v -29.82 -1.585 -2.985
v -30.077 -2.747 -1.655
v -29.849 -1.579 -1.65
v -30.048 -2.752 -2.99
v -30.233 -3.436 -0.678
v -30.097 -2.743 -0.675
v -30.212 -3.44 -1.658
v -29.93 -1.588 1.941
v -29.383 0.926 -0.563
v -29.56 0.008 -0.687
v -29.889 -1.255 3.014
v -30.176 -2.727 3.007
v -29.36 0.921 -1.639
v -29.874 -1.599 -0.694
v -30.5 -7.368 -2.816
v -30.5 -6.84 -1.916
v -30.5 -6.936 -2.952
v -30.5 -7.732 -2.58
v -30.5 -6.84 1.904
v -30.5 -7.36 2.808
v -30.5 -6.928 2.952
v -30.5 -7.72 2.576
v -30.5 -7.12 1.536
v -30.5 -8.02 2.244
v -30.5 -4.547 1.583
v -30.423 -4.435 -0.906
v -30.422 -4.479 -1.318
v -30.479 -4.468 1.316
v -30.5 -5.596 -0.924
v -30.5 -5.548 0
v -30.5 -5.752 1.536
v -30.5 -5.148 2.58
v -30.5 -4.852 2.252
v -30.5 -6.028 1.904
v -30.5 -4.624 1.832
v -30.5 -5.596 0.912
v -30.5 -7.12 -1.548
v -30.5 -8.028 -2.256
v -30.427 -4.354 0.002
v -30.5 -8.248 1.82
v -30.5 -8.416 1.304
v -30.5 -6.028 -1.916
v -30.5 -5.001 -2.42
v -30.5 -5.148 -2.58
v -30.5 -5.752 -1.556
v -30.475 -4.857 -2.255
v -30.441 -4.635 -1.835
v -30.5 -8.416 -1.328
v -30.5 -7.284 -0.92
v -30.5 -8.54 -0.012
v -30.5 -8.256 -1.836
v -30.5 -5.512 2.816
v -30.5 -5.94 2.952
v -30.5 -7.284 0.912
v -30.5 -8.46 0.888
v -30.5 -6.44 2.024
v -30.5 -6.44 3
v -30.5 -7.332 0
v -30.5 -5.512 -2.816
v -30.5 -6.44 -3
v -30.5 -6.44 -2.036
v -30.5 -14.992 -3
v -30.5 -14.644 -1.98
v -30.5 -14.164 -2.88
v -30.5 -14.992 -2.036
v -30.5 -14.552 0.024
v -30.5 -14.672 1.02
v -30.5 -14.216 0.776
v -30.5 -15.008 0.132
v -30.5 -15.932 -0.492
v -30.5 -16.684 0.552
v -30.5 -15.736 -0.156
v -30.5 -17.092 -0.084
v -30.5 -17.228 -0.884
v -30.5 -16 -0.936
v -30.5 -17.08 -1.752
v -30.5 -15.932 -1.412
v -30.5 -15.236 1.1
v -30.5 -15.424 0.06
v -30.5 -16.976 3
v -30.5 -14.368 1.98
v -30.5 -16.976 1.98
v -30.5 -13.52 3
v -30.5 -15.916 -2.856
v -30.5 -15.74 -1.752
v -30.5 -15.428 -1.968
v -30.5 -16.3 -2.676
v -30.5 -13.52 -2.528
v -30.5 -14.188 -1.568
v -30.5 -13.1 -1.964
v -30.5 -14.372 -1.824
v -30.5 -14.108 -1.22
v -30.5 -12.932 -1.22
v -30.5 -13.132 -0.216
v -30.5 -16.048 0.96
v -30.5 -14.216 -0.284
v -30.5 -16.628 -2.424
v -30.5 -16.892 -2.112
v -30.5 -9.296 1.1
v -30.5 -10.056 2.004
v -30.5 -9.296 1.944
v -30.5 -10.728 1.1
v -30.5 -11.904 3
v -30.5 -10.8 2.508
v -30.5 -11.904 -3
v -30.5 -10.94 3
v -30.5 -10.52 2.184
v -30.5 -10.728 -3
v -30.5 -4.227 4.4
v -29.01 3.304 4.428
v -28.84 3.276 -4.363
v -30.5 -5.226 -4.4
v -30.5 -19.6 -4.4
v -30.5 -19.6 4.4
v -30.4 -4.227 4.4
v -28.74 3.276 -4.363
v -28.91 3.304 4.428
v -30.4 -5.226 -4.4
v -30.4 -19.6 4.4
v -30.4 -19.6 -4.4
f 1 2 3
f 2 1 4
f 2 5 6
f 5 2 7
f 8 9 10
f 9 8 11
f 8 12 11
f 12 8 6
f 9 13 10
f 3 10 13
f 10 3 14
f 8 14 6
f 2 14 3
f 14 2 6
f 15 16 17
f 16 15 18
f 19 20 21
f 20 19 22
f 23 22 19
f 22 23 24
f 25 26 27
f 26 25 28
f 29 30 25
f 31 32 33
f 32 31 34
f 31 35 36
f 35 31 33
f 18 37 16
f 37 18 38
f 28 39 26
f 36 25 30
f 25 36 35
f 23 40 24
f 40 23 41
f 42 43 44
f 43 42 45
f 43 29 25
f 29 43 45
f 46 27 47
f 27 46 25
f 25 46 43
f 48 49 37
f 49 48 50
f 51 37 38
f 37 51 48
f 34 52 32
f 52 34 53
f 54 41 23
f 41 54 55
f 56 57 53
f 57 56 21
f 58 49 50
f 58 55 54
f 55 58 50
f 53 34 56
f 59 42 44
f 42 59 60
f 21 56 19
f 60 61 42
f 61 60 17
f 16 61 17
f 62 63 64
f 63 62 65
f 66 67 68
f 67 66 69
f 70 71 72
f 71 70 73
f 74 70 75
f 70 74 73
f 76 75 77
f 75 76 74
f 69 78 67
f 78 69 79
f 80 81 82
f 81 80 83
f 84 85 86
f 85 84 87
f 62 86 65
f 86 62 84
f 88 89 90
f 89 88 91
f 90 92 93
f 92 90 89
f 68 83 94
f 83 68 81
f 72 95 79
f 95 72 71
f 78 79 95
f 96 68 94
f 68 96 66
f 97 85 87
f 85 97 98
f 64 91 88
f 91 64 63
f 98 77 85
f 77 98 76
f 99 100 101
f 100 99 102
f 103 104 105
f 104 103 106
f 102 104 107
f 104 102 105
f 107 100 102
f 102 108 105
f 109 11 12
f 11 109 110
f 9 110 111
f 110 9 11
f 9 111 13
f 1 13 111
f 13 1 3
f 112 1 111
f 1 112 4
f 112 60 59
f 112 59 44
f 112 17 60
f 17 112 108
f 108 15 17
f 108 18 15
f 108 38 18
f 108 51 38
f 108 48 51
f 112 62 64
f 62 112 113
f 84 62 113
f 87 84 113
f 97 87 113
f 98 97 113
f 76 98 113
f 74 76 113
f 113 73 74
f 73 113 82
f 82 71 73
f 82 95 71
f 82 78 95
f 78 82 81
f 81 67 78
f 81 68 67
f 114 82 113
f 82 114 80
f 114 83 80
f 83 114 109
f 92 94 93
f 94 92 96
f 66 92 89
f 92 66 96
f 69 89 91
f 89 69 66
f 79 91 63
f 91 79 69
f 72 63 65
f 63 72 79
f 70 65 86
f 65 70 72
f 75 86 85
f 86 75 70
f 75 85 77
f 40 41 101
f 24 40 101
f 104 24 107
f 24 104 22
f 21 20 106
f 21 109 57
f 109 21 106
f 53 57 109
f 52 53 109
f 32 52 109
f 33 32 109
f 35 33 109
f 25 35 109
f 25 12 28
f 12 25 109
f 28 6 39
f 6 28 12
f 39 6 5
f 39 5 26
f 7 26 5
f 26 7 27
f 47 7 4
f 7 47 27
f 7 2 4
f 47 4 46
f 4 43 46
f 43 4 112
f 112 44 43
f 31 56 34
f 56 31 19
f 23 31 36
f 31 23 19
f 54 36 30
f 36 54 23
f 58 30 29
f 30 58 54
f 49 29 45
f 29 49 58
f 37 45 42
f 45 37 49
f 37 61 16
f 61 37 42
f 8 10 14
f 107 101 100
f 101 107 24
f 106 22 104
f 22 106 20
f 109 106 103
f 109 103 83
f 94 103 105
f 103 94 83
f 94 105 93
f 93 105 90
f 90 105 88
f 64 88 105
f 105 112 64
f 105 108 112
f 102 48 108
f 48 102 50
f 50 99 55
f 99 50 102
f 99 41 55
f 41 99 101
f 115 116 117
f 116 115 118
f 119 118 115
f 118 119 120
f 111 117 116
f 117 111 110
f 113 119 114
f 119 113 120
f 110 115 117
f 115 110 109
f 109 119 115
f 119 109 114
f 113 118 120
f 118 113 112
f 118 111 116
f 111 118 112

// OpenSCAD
use <../lib.scad>
function ldraw_lib__194295bc02() = [
// 0 Sticker  1.1 x  2.9 with White "4015" on Transparent Background (Formed for Boat Stern Right Side)
// 0 Name: 194295bc02.dat
// 0 Author: Takeshi Takahashi [RainbowDolphin]
// 0 !LDRAW_ORG Part UPDATE 2024-04
// 0 !LICENSE Licensed under CC BY 4.0 : see CAreadme.txt
// 
// 0 BFC CERTIFY CCW
  [0,"BFC","CERTIFY"],
  [0,"BFC","CCW"],
// 
// 0 !KEYWORDS Bricklink 4015stk01, Brickowl 526213, Freighter, Rebrickable 194295
// 0 !KEYWORDS Set 4015
// 
// 0 !HISTORY 2024-05-28 [OrionP] Official Update 2024-04
// 
// 
// 0 BFC NOCLIP
  [0,"BFC","NOCLIP"],
// 4 15 -74.5501 7.4623 -3.9621 -75.12 7.4749 -6.8807 -75.1913 4.1365 -6.8668 -74.6214 4.1239 -3.9481
  [4,15,-74.5501,7.4623,-3.9621,-75.12,7.4749,-6.8807,-75.1913,4.1365,-6.8668,-74.6214,4.1239,-3.9481],
// 4 15 -75.2436 1.6877 -6.8566 -75.1913 4.1365 -6.8668 -75.5298 4.144 -8.6007 -75.5821 1.6952 -8.5905
  [4,15,-75.2436,1.6877,-6.8566,-75.1913,4.1365,-6.8668,-75.5298,4.144,-8.6007,-75.5821,1.6952,-8.5905],
// 4 15 -73.8995 1.7179 .0208 -74.8247 -4.8516 -3.9694 -74.7218 -7.5339 -3.1385 -73.4583 1.4081 2.3146
  [4,15,-73.8995,1.7179,.0208,-74.8247,-4.8516,-3.9694,-74.7218,-7.5339,-3.1385,-73.4583,1.4081,2.3146],
// 4 15 -75.4403 -7.518 -6.8182 -74.7218 -7.5339 -3.1385 -74.8247 -4.8516 -3.9694 -75.2436 1.6877 -6.8566
  [4,15,-75.4403,-7.518,-6.8182,-74.7218,-7.5339,-3.1385,-74.8247,-4.8516,-3.9694,-75.2436,1.6877,-6.8566],
// 3 15 -73.4583 1.4081 2.3146 -73.4008 4.0968 2.3034 -73.8995 1.7179 .0208
  [3,15,-73.4583,1.4081,2.3146,-73.4008,4.0968,2.3034,-73.8995,1.7179,.0208],
// 4 15 -74.6839 1.7353 -3.9969 -73.8995 1.7179 .0208 -73.4008 4.0968 2.3034 -74.6214 4.1239 -3.9481
  [4,15,-74.6839,1.7353,-3.9969,-73.8995,1.7179,.0208,-73.4008,4.0968,2.3034,-74.6214,4.1239,-3.9481],
// 3 15 -74.8247 -4.8516 -3.9694 -74.6839 1.7353 -3.9969 -75.2436 1.6877 -6.8566
  [3,15,-74.8247,-4.8516,-3.9694,-74.6839,1.7353,-3.9969,-75.2436,1.6877,-6.8566],
// 4 15 -74.6214 4.1239 -3.9481 -75.1913 4.1365 -6.8668 -75.2436 1.6877 -6.8566 -74.6839 1.7353 -3.9969
  [4,15,-74.6214,4.1239,-3.9481,-75.1913,4.1365,-6.8668,-75.2436,1.6877,-6.8566,-74.6839,1.7353,-3.9969],
// 4 15 -76.25 6.45 -19.33 -76.25 4.79 -17.1 -76.25 7.38 -17.34 -76.25 7.04 -18.42
  [4,15,-76.25,6.45,-19.33,-76.25,4.79,-17.1,-76.25,7.38,-17.34,-76.25,7.04,-18.42],
// 4 15 -76.25 -7.38 -17.32 -76.25 -4.76 -17.1 -76.25 -6.44 -19.3 -76.25 -7.02 -18.4
  [4,15,-76.25,-7.38,-17.32,-76.25,-4.76,-17.1,-76.25,-6.44,-19.3,-76.25,-7.02,-18.4],
// 4 15 -76.25 -5.61 -20.05 -76.25 -6.44 -19.3 -76.25 -4.76 -17.1 -76.25 -3.84 -17.8
  [4,15,-76.25,-5.61,-20.05,-76.25,-6.44,-19.3,-76.25,-4.76,-17.1,-76.25,-3.84,-17.8],
// 4 15 -76.1967 -3.2912 -11.1704 -76.0573 2.2657 -11.0876 -76.056 3.2957 -11.1979 -76.25 -3.9585 -11.3673
  [4,15,-76.1967,-3.2912,-11.1704,-76.0573,2.2657,-11.0876,-76.056,3.2957,-11.1979,-76.25,-3.9585,-11.3673],
// 3 15 -76.25 2.31 -13.99 -76.25 0 -13.87 -76.25 -3.9585 -11.3673
  [3,15,-76.25,2.31,-13.99,-76.25,0,-13.87,-76.25,-3.9585,-11.3673],
// 4 15 -76.25 -4.76 -15.07 -76.25 -6.45 -12.87 -76.25 -5.63 -12.13 -76.25 -3.84 -14.38
  [4,15,-76.25,-4.76,-15.07,-76.25,-6.45,-12.87,-76.25,-5.63,-12.13,-76.25,-3.84,-14.38],
// 4 15 -76.25 -3.84 -14.38 -76.25 -5.63 -12.13 -76.25 -4.58 -11.56 -76.25 -2.28 -13.99
  [4,15,-76.25,-3.84,-14.38,-76.25,-5.63,-12.13,-76.25,-4.58,-11.56,-76.25,-2.28,-13.99],
// 4 15 -76.25 4.79 -17.1 -76.25 6.45 -19.33 -76.25 5.64 -20.07 -76.25 3.87 -17.8
  [4,15,-76.25,4.79,-17.1,-76.25,6.45,-19.33,-76.25,5.64,-20.07,-76.25,3.87,-17.8],
// 3 15 -76.1967 -3.2912 -11.1704 -76.0682 -.004 -10.8855 -76.0573 2.2657 -11.0876
  [3,15,-76.1967,-3.2912,-11.1704,-76.0682,-.004,-10.8855,-76.0573,2.2657,-11.0876],
// 4 15 -76.25 0 -13.87 -76.25 -2.28 -13.99 -76.25 -4.58 -11.56 -76.25 -3.9585 -11.3673
  [4,15,-76.25,0,-13.87,-76.25,-2.28,-13.99,-76.25,-4.58,-11.56,-76.25,-3.9585,-11.3673],
// 4 15 -76.25 -3.26 -21.04 -76.25 -4.55 -20.62 -76.25 -5.61 -20.05 -76.25 -3.84 -17.8
  [4,15,-76.25,-3.26,-21.04,-76.25,-4.55,-20.62,-76.25,-5.61,-20.05,-76.25,-3.84,-17.8],
// 4 15 -76.25 3.89 -14.38 -76.25 6.049 -12.5036 -76.25 6.45 -12.87 -76.25 4.79 -15.07
  [4,15,-76.25,3.89,-14.38,-76.25,6.049,-12.5036,-76.25,6.45,-12.87,-76.25,4.79,-15.07],
// 4 15 -76.25 6.049 -12.5036 -76.25 3.89 -14.38 -76.25 2.31 -13.99 -76.25 -3.9585 -11.3673
  [4,15,-76.25,6.049,-12.5036,-76.25,3.89,-14.38,-76.25,2.31,-13.99,-76.25,-3.9585,-11.3673],
// 4 15 -76.056 3.2957 -11.1979 -76.1037 4.5868 -11.5886 -76.1885 5.6386 -12.142 -76.25 -3.9585 -11.3673
  [4,15,-76.056,3.2957,-11.1979,-76.1037,4.5868,-11.5886,-76.1885,5.6386,-12.142,-76.25,-3.9585,-11.3673],
// 3 15 -76.25 -3.9585 -11.3673 -76.1885 5.6386 -12.142 -76.25 6.049 -12.5036
  [3,15,-76.25,-3.9585,-11.3673,-76.1885,5.6386,-12.142,-76.25,6.049,-12.5036],
// 4 15 -76.25 .03 -21.35 -76.25 2.3 -18.21 -76.25 3.87 -17.8 -76.25 3.32 -21.04
  [4,15,-76.25,.03,-21.35,-76.25,2.3,-18.21,-76.25,3.87,-17.8,-76.25,3.32,-21.04],
// 4 15 -76.25 5.64 -20.07 -76.25 4.59 -20.64 -76.25 3.32 -21.04 -76.25 3.87 -17.8
  [4,15,-76.25,5.64,-20.07,-76.25,4.59,-20.64,-76.25,3.32,-21.04,-76.25,3.87,-17.8],
// 4 15 -76.25 -6.45 -12.87 -76.25 -4.76 -15.07 -76.25 -7.38 -14.85 -76.25 -7.04 -13.78
  [4,15,-76.25,-6.45,-12.87,-76.25,-4.76,-15.07,-76.25,-7.38,-14.85,-76.25,-7.04,-13.78],
// 4 15 -76.25 -3.84 -17.8 -76.25 -2.28 -18.21 -76.25 -2.22 -21.15 -76.25 -3.26 -21.04
  [4,15,-76.25,-3.84,-17.8,-76.25,-2.28,-18.21,-76.25,-2.22,-21.15,-76.25,-3.26,-21.04],
// 4 15 -76.25 -7.38 -17.32 -76.25 -7.5 -16.1 -76.25 -7.38 -14.85 -76.25 -5.06 -16.1
  [4,15,-76.25,-7.38,-17.32,-76.25,-7.5,-16.1,-76.25,-7.38,-14.85,-76.25,-5.06,-16.1],
// 3 15 -76.25 0 -18.33 -76.25 2.3 -18.21 -76.25 .03 -21.35
  [3,15,-76.25,0,-18.33,-76.25,2.3,-18.21,-76.25,.03,-21.35],
// 4 15 -76.25 -2.28 -18.21 -76.25 0 -18.33 -76.25 .03 -21.35 -76.25 -2.22 -21.15
  [4,15,-76.25,-2.28,-18.21,-76.25,0,-18.33,-76.25,.03,-21.35,-76.25,-2.22,-21.15],
// 3 15 -76.25 -7.38 -14.85 -76.25 -4.76 -15.07 -76.25 -5.06 -16.1
  [3,15,-76.25,-7.38,-14.85,-76.25,-4.76,-15.07,-76.25,-5.06,-16.1],
// 4 15 -76.25 6.45 -12.87 -76.25 7.04 -13.78 -76.25 7.5 -16.1 -76.25 4.79 -15.07
  [4,15,-76.25,6.45,-12.87,-76.25,7.04,-13.78,-76.25,7.5,-16.1,-76.25,4.79,-15.07],
// 3 15 -76.25 -7.38 -17.32 -76.25 -5.06 -16.1 -76.25 -4.76 -17.1
  [3,15,-76.25,-7.38,-17.32,-76.25,-5.06,-16.1,-76.25,-4.76,-17.1],
// 4 15 -76.25 4.79 -15.07 -76.25 7.5 -16.1 -76.25 7.38 -17.34 -76.25 5.09 -16.1
  [4,15,-76.25,4.79,-15.07,-76.25,7.5,-16.1,-76.25,7.38,-17.34,-76.25,5.09,-16.1],
// 3 15 -76.25 4.79 -17.1 -76.25 5.09 -16.1 -76.25 7.38 -17.34
  [3,15,-76.25,4.79,-17.1,-76.25,5.09,-16.1,-76.25,7.38,-17.34],
// 4 15 -76.25 7.2 -35.41 -76.25 7.5 -37.48 -76.25 5.09 -37.48 -76.25 4.95 -36.61
  [4,15,-76.25,7.2,-35.41,-76.25,7.5,-37.48,-76.25,5.09,-37.48,-76.25,4.95,-36.61],
// 4 15 -76.25 -1.94 -35.54 -76.25 -.06 -36.379 -76.25 -.33 -37.52 -76.25 -2.55 -36.68
  [4,15,-76.25,-1.94,-35.54,-76.25,-.06,-36.379,-76.25,-.33,-37.52,-76.25,-2.55,-36.68],
// 4 15 -76.25 .39 -39.34 -76.25 1.23 -39.83 -76.25 .21 -42.73 -76.25 -1.38 -41.71
  [4,15,-76.25,.39,-39.34,-76.25,1.23,-39.83,-76.25,.21,-42.73,-76.25,-1.38,-41.71],
// 4 15 -76.25 .21 -42.73 -76.25 1.23 -39.83 -76.25 2.34 -40 -76.25 2.21 -43.07
  [4,15,-76.25,.21,-42.73,-76.25,1.23,-39.83,-76.25,2.34,-40,-76.25,2.21,-43.07],
// 4 15 -76.25 3.53 -39.83 -76.25 4.38 -42.7 -76.25 2.21 -43.07 -76.25 2.34 -40
  [4,15,-76.25,3.53,-39.83,-76.25,4.38,-42.7,-76.25,2.21,-43.07,-76.25,2.34,-40],
// 4 15 -76.25 -2.55 -36.68 -76.25 -.33 -37.52 -76.25 -.15 -38.56 -76.25 -2.75 -38.09
  [4,15,-76.25,-2.55,-36.68,-76.25,-.33,-37.52,-76.25,-.15,-38.56,-76.25,-2.75,-38.09],
// 4 15 -76.25 -7.5 -33.8 -76.25 -4.95 -35.92 -76.25 -4.95 -42.44 -76.25 -7.5 -42.44
  [4,15,-76.25,-7.5,-33.8,-76.25,-4.95,-35.92,-76.25,-4.95,-42.44,-76.25,-7.5,-42.44],
// 4 15 -76.25 6.69 -40.75 -76.25 4.38 -39.35 -76.25 4.92 -38.57 -76.25 7.14 -39.79
  [4,15,-76.25,6.69,-40.75,-76.25,4.38,-39.35,-76.25,4.92,-38.57,-76.25,7.14,-39.79],
// 4 15 -76.25 5.09 -37.48 -76.25 7.5 -37.48 -76.25 7.14 -39.79 -76.25 4.92 -38.57
  [4,15,-76.25,5.09,-37.48,-76.25,7.5,-37.48,-76.25,7.14,-39.79,-76.25,4.92,-38.57],
// 4 15 -76.25 4.56 -35.93 -76.25 3.92 -35.47 -76.25 4.91 -32.75 -76.25 6.32 -33.8
  [4,15,-76.25,4.56,-35.93,-76.25,3.92,-35.47,-76.25,4.91,-32.75,-76.25,6.32,-33.8],
// 4 15 -76.25 3.05 -32.33 -76.25 4.91 -32.75 -76.25 3.92 -35.47 -76.25 3.05 -35.27
  [4,15,-76.25,3.05,-32.33,-76.25,4.91,-32.75,-76.25,3.92,-35.47,-76.25,3.05,-35.27],
// 4 15 -76.25 -4.95 -35.92 -76.25 -7.5 -33.8 -76.25 .54 -32.83 -76.25 -1.94 -35.54
  [4,15,-76.25,-4.95,-35.92,-76.25,-7.5,-33.8,-76.25,.54,-32.83,-76.25,-1.94,-35.54],
// 4 15 -76.25 -1.38 -41.71 -76.25 -2.4 -40.12 -76.25 -.15 -38.56 -76.25 .39 -39.34
  [4,15,-76.25,-1.38,-41.71,-76.25,-2.4,-40.12,-76.25,-.15,-38.56,-76.25,.39,-39.34],
// 3 15 -76.25 -2.75 -38.09 -76.25 -.15 -38.56 -76.25 -2.4 -40.12
  [3,15,-76.25,-2.75,-38.09,-76.25,-.15,-38.56,-76.25,-2.4,-40.12],
// 4 15 -76.25 .54 -32.83 -76.25 .71 -35.54 -76.25 -.06 -36.379 -76.25 -1.94 -35.54
  [4,15,-76.25,.54,-32.83,-76.25,.71,-35.54,-76.25,-.06,-36.379,-76.25,-1.94,-35.54],
// 4 15 -76.25 5.28 -42.23 -76.25 4.38 -39.35 -76.25 6.69 -40.75 -76.25 6.06 -41.57
  [4,15,-76.25,5.28,-42.23,-76.25,4.38,-39.35,-76.25,6.69,-40.75,-76.25,6.06,-41.57],
// 4 15 -76.25 6.32 -33.8 -76.25 7.2 -35.41 -76.25 4.95 -36.61 -76.25 4.56 -35.93
  [4,15,-76.25,6.32,-33.8,-76.25,7.2,-35.41,-76.25,4.95,-36.61,-76.25,4.56,-35.93],
// 4 15 -76.25 4.38 -42.7 -76.25 3.53 -39.83 -76.25 4.38 -39.35 -76.25 5.28 -42.23
  [4,15,-76.25,4.38,-42.7,-76.25,3.53,-39.83,-76.25,4.38,-39.35,-76.25,5.28,-42.23],
// 4 15 -76.25 -2.75 -23.24 -76.25 -2.75 -26.82 -76.25 -5.01 -25.14 -76.25 -4.86 -23.24
  [4,15,-76.25,-2.75,-23.24,-76.25,-2.75,-26.82,-76.25,-5.01,-25.14,-76.25,-4.86,-23.24],
// 4 15 -76.25 -6.27 -27 -76.25 7.5 -29.76 -76.25 -7.5 -29.76 -76.25 -7.5 -27.35
  [4,15,-76.25,-6.27,-27,-76.25,7.5,-29.76,-76.25,-7.5,-29.76,-76.25,-7.5,-27.35],
// 4 15 -76.25 -2.75 -26.82 -76.25 7.5 -29.76 -76.25 -6.27 -27 -76.25 -5.46 -26.3
  [4,15,-76.25,-2.75,-26.82,-76.25,7.5,-29.76,-76.25,-6.27,-27,-76.25,-5.46,-26.3],
// 3 15 -76.25 -5.46 -26.3 -76.25 -5.01 -25.14 -76.25 -2.75 -26.82
  [3,15,-76.25,-5.46,-26.3,-76.25,-5.01,-25.14,-76.25,-2.75,-26.82],
// 3 15 -76.25 -2.75 -26.82 -76.25 7.5 -26.82 -76.25 7.5 -29.76
  [3,15,-76.25,-2.75,-26.82,-76.25,7.5,-26.82,-76.25,7.5,-29.76],
// 0 BFC CLIP
  [0,"BFC","CLIP"],
// 4 16 -75.4403 -7.518 -6.8182 -76.25 -11 -10.5677 -72.5254 -11.0706 8.2593 -74.7218 -7.5339 -3.1385
  [4,16,-75.4403,-7.518,-6.8182,-76.25,-11,-10.5677,-72.5254,-11.0706,8.2593,-74.7218,-7.5339,-3.1385],
// 4 16 -73.4583 1.4081 2.3146 -74.7218 -7.5339 -3.1385 -72.5254 -11.0706 8.2593 -72.0999 10.9079 8.1893
  [4,16,-73.4583,1.4081,2.3146,-74.7218,-7.5339,-3.1385,-72.5254,-11.0706,8.2593,-72.0999,10.9079,8.1893],
// 3 16 -73.4583 1.4081 2.3146 -72.0999 10.9079 8.1893 -73.4008 4.0968 2.3034
  [3,16,-73.4583,1.4081,2.3146,-72.0999,10.9079,8.1893,-73.4008,4.0968,2.3034],
// 4 16 -74.6214 4.1239 -3.9481 -73.4008 4.0968 2.3034 -72.0999 10.9079 8.1893 -74.5501 7.4623 -3.9621
  [4,16,-74.6214,4.1239,-3.9481,-73.4008,4.0968,2.3034,-72.0999,10.9079,8.1893,-74.5501,7.4623,-3.9621],
// 4 16 -75.12 7.4749 -6.8807 -74.5501 7.4623 -3.9621 -72.0999 10.9079 8.1893 -76.25 11 -13.0658
  [4,16,-75.12,7.4749,-6.8807,-74.5501,7.4623,-3.9621,-72.0999,10.9079,8.1893,-76.25,11,-13.0658],
// 3 16 -76.25 11 -13.0658 -76.25 7.5 -16.1 -76.25 7.04 -13.78
  [3,16,-76.25,11,-13.0658,-76.25,7.5,-16.1,-76.25,7.04,-13.78],
// 3 16 -76.25 11 -13.0658 -76.25 7.04 -13.78 -76.25 6.45 -12.87
  [3,16,-76.25,11,-13.0658,-76.25,7.04,-13.78,-76.25,6.45,-12.87],
// 4 16 -76.25 7.5 -16.1 -76.25 11 -13.0658 -76.25 7.5 -26.82 -76.25 7.38 -17.34
  [4,16,-76.25,7.5,-16.1,-76.25,11,-13.0658,-76.25,7.5,-26.82,-76.25,7.38,-17.34],
// 3 16 -76.25 7.5 -26.82 -76.25 7.04 -18.42 -76.25 7.38 -17.34
  [3,16,-76.25,7.5,-26.82,-76.25,7.04,-18.42,-76.25,7.38,-17.34],
// 3 16 -76.25 7.5 -26.82 -76.25 6.45 -19.33 -76.25 7.04 -18.42
  [3,16,-76.25,7.5,-26.82,-76.25,6.45,-19.33,-76.25,7.04,-18.42],
// 3 16 -76.25 7.5 -26.82 -76.25 5.64 -20.07 -76.25 6.45 -19.33
  [3,16,-76.25,7.5,-26.82,-76.25,5.64,-20.07,-76.25,6.45,-19.33],
// 3 16 -76.25 7.5 -26.82 -76.25 4.59 -20.64 -76.25 5.64 -20.07
  [3,16,-76.25,7.5,-26.82,-76.25,4.59,-20.64,-76.25,5.64,-20.07],
// 3 16 -76.25 7.5 -26.82 -76.25 3.32 -21.04 -76.25 4.59 -20.64
  [3,16,-76.25,7.5,-26.82,-76.25,3.32,-21.04,-76.25,4.59,-20.64],
// 4 16 -76.25 7.5 -37.48 -76.25 7.2 -35.41 -76.25 11 -13.0658 -76.25 11 -49
  [4,16,-76.25,7.5,-37.48,-76.25,7.2,-35.41,-76.25,11,-13.0658,-76.25,11,-49],
// 3 16 -76.25 7.14 -39.79 -76.25 7.5 -37.48 -76.25 11 -49
  [3,16,-76.25,7.14,-39.79,-76.25,7.5,-37.48,-76.25,11,-49],
// 3 16 -76.25 6.69 -40.75 -76.25 7.14 -39.79 -76.25 11 -49
  [3,16,-76.25,6.69,-40.75,-76.25,7.14,-39.79,-76.25,11,-49],
// 3 16 -76.25 6.06 -41.57 -76.25 6.69 -40.75 -76.25 11 -49
  [3,16,-76.25,6.06,-41.57,-76.25,6.69,-40.75,-76.25,11,-49],
// 3 16 -76.25 5.28 -42.23 -76.25 6.06 -41.57 -76.25 11 -49
  [3,16,-76.25,5.28,-42.23,-76.25,6.06,-41.57,-76.25,11,-49],
// 3 16 -76.25 4.38 -42.7 -76.25 5.28 -42.23 -76.25 11 -49
  [3,16,-76.25,4.38,-42.7,-76.25,5.28,-42.23,-76.25,11,-49],
// 3 16 -76.25 2.21 -43.07 -76.25 4.38 -42.7 -76.25 11 -49
  [3,16,-76.25,2.21,-43.07,-76.25,4.38,-42.7,-76.25,11,-49],
// 4 16 -76.25 .21 -42.73 -76.25 2.21 -43.07 -76.25 11 -49 -76.25 -4.95 -42.44
  [4,16,-76.25,.21,-42.73,-76.25,2.21,-43.07,-76.25,11,-49,-76.25,-4.95,-42.44],
// 3 16 -76.25 -4.95 -42.44 -76.25 -1.38 -41.71 -76.25 .21 -42.73
  [3,16,-76.25,-4.95,-42.44,-76.25,-1.38,-41.71,-76.25,.21,-42.73],
// 3 16 -76.25 -4.95 -42.44 -76.25 -2.4 -40.12 -76.25 -1.38 -41.71
  [3,16,-76.25,-4.95,-42.44,-76.25,-2.4,-40.12,-76.25,-1.38,-41.71],
// 4 16 -76.25 -2.75 -38.09 -76.25 -2.4 -40.12 -76.25 -4.95 -42.44 -76.25 -4.95 -35.92
  [4,16,-76.25,-2.75,-38.09,-76.25,-2.4,-40.12,-76.25,-4.95,-42.44,-76.25,-4.95,-35.92],
// 3 16 -76.25 -4.95 -35.92 -76.25 -2.55 -36.68 -76.25 -2.75 -38.09
  [3,16,-76.25,-4.95,-35.92,-76.25,-2.55,-36.68,-76.25,-2.75,-38.09],
// 3 16 -76.25 -4.95 -35.92 -76.25 -1.94 -35.54 -76.25 -2.55 -36.68
  [3,16,-76.25,-4.95,-35.92,-76.25,-1.94,-35.54,-76.25,-2.55,-36.68],
// 4 16 -76.25 -4.95 -42.44 -76.25 11 -49 -76.25 -11 -49 -76.25 -7.5 -42.44
  [4,16,-76.25,-4.95,-42.44,-76.25,11,-49,-76.25,-11,-49,-76.25,-7.5,-42.44],
// 4 16 -76.25 -7.5 -33.8 -76.25 -7.5 -42.44 -76.25 -11 -49 -76.25 -11 -10.5677
  [4,16,-76.25,-7.5,-33.8,-76.25,-7.5,-42.44,-76.25,-11,-49,-76.25,-11,-10.5677],
// 4 16 -76.25 .71 -35.54 -76.25 .54 -32.83 -76.25 3.05 -32.33 -76.25 3.05 -35.27
  [4,16,-76.25,.71,-35.54,-76.25,.54,-32.83,-76.25,3.05,-32.33,-76.25,3.05,-35.27],
// 4 16 -76.25 -.06 -36.379 -76.25 .71 -35.54 -76.25 3.05 -35.27 -76.25 3.92 -35.47
  [4,16,-76.25,-.06,-36.379,-76.25,.71,-35.54,-76.25,3.05,-35.27,-76.25,3.92,-35.47],
// 4 16 -76.25 -.33 -37.52 -76.25 -.06 -36.379 -76.25 3.92 -35.47 -76.25 4.56 -35.93
  [4,16,-76.25,-.33,-37.52,-76.25,-.06,-36.379,-76.25,3.92,-35.47,-76.25,4.56,-35.93],
// 4 16 -76.25 -.15 -38.56 -76.25 -.33 -37.52 -76.25 4.56 -35.93 -76.25 4.95 -36.61
  [4,16,-76.25,-.15,-38.56,-76.25,-.33,-37.52,-76.25,4.56,-35.93,-76.25,4.95,-36.61],
// 4 16 -76.25 .39 -39.34 -76.25 -.15 -38.56 -76.25 4.95 -36.61 -76.25 5.09 -37.48
  [4,16,-76.25,.39,-39.34,-76.25,-.15,-38.56,-76.25,4.95,-36.61,-76.25,5.09,-37.48],
// 4 16 -76.25 1.23 -39.83 -76.25 .39 -39.34 -76.25 5.09 -37.48 -76.25 4.92 -38.57
  [4,16,-76.25,1.23,-39.83,-76.25,.39,-39.34,-76.25,5.09,-37.48,-76.25,4.92,-38.57],
// 4 16 -76.25 2.34 -40 -76.25 1.23 -39.83 -76.25 4.92 -38.57 -76.25 4.38 -39.35
  [4,16,-76.25,2.34,-40,-76.25,1.23,-39.83,-76.25,4.92,-38.57,-76.25,4.38,-39.35],
// 3 16 -76.25 2.34 -40 -76.25 4.38 -39.35 -76.25 3.53 -39.83
  [3,16,-76.25,2.34,-40,-76.25,4.38,-39.35,-76.25,3.53,-39.83],
// 3 16 -76.25 -4.55 -20.62 -76.25 -3.26 -21.04 -76.25 -4.86 -23.24
  [3,16,-76.25,-4.55,-20.62,-76.25,-3.26,-21.04,-76.25,-4.86,-23.24],
// 3 16 -76.25 -5.61 -20.05 -76.25 -4.55 -20.62 -76.25 -4.86 -23.24
  [3,16,-76.25,-5.61,-20.05,-76.25,-4.55,-20.62,-76.25,-4.86,-23.24],
// 4 16 -76.25 -6.27 -27 -76.25 -6.44 -19.3 -76.25 -5.61 -20.05 -76.25 -5.46 -26.3
  [4,16,-76.25,-6.27,-27,-76.25,-6.44,-19.3,-76.25,-5.61,-20.05,-76.25,-5.46,-26.3],
// 3 16 -76.25 -7.38 -17.32 -76.25 -7.02 -18.4 -76.25 -7.5 -27.35
  [3,16,-76.25,-7.38,-17.32,-76.25,-7.02,-18.4,-76.25,-7.5,-27.35],
// 4 16 -76.25 -7.5 -27.35 -76.25 -11 -10.5677 -76.25 -7.5 -16.1 -76.25 -7.38 -17.32
  [4,16,-76.25,-7.5,-27.35,-76.25,-11,-10.5677,-76.25,-7.5,-16.1,-76.25,-7.38,-17.32],
// 3 16 -76.25 -7.38 -14.85 -76.25 -7.5 -16.1 -76.25 -11 -10.5677
  [3,16,-76.25,-7.38,-14.85,-76.25,-7.5,-16.1,-76.25,-11,-10.5677],
// 3 16 -76.25 -7.04 -13.78 -76.25 -7.38 -14.85 -76.25 -11 -10.5677
  [3,16,-76.25,-7.04,-13.78,-76.25,-7.38,-14.85,-76.25,-11,-10.5677],
// 3 16 -76.25 -6.45 -12.87 -76.25 -7.04 -13.78 -76.25 -11 -10.5677
  [3,16,-76.25,-6.45,-12.87,-76.25,-7.04,-13.78,-76.25,-11,-10.5677],
// 3 16 -76.25 -5.63 -12.13 -76.25 -6.45 -12.87 -76.25 -11 -10.5677
  [3,16,-76.25,-5.63,-12.13,-76.25,-6.45,-12.87,-76.25,-11,-10.5677],
// 3 16 -76.25 -4.58 -11.56 -76.25 -5.63 -12.13 -76.25 -11 -10.5677
  [3,16,-76.25,-4.58,-11.56,-76.25,-5.63,-12.13,-76.25,-11,-10.5677],
// 3 16 -76.25 -3.9585 -11.3673 -76.25 -4.58 -11.56 -76.25 -11 -10.5677
  [3,16,-76.25,-3.9585,-11.3673,-76.25,-4.58,-11.56,-76.25,-11,-10.5677],
// 4 16 -76.25 -11 -10.5677 -75.4403 -7.518 -6.8182 -76.1967 -3.2912 -11.1704 -76.25 -3.9585 -11.3673
  [4,16,-76.25,-11,-10.5677,-75.4403,-7.518,-6.8182,-76.1967,-3.2912,-11.1704,-76.25,-3.9585,-11.3673],
// 4 16 -76.0682 -.004 -10.8855 -76.1967 -3.2912 -11.1704 -75.4403 -7.518 -6.8182 -75.2436 1.6877 -6.8566
  [4,16,-76.0682,-.004,-10.8855,-76.1967,-3.2912,-11.1704,-75.4403,-7.518,-6.8182,-75.2436,1.6877,-6.8566],
// 3 16 -76.0682 -.004 -10.8855 -75.2436 1.6877 -6.8566 -75.5821 1.6952 -8.5905
  [3,16,-76.0682,-.004,-10.8855,-75.2436,1.6877,-6.8566,-75.5821,1.6952,-8.5905],
// 3 16 -76.0682 -.004 -10.8855 -75.5821 1.6952 -8.5905 -76.0573 2.2657 -11.0876
  [3,16,-76.0682,-.004,-10.8855,-75.5821,1.6952,-8.5905,-76.0573,2.2657,-11.0876],
// 4 16 -76.056 3.2957 -11.1979 -76.0573 2.2657 -11.0876 -75.5821 1.6952 -8.5905 -75.5298 4.144 -8.6007
  [4,16,-76.056,3.2957,-11.1979,-76.0573,2.2657,-11.0876,-75.5821,1.6952,-8.5905,-75.5298,4.144,-8.6007],
// 4 16 -76.1037 4.5868 -11.5886 -76.056 3.2957 -11.1979 -75.5298 4.144 -8.6007 -75.12 7.4749 -6.8807
  [4,16,-76.1037,4.5868,-11.5886,-76.056,3.2957,-11.1979,-75.5298,4.144,-8.6007,-75.12,7.4749,-6.8807],
// 3 16 -75.5298 4.144 -8.6007 -75.1913 4.1365 -6.8668 -75.12 7.4749 -6.8807
  [3,16,-75.5298,4.144,-8.6007,-75.1913,4.1365,-6.8668,-75.12,7.4749,-6.8807],
// 3 16 -76.1037 4.5868 -11.5886 -75.12 7.4749 -6.8807 -76.1885 5.6386 -12.142
  [3,16,-76.1037,4.5868,-11.5886,-75.12,7.4749,-6.8807,-76.1885,5.6386,-12.142],
// 4 16 -76.1885 5.6386 -12.142 -75.12 7.4749 -6.8807 -76.25 11 -13.0658 -76.25 6.049 -12.5036
  [4,16,-76.1885,5.6386,-12.142,-75.12,7.4749,-6.8807,-76.25,11,-13.0658,-76.25,6.049,-12.5036],
// 3 16 -76.25 11 -13.0658 -76.25 6.45 -12.87 -76.25 6.049 -12.5036
  [3,16,-76.25,11,-13.0658,-76.25,6.45,-12.87,-76.25,6.049,-12.5036],
// 4 16 -76.25 -4.76 -17.1 -76.25 -5.06 -16.1 -76.25 -4.76 -15.07 -76.25 -3.84 -14.38
  [4,16,-76.25,-4.76,-17.1,-76.25,-5.06,-16.1,-76.25,-4.76,-15.07,-76.25,-3.84,-14.38],
// 4 16 -76.25 -3.84 -17.8 -76.25 -4.76 -17.1 -76.25 -3.84 -14.38 -76.25 -2.28 -13.99
  [4,16,-76.25,-3.84,-17.8,-76.25,-4.76,-17.1,-76.25,-3.84,-14.38,-76.25,-2.28,-13.99],
// 4 16 -76.25 -2.28 -18.21 -76.25 -3.84 -17.8 -76.25 -2.28 -13.99 -76.25 0 -13.87
  [4,16,-76.25,-2.28,-18.21,-76.25,-3.84,-17.8,-76.25,-2.28,-13.99,-76.25,0,-13.87],
// 4 16 -76.25 0 -18.33 -76.25 -2.28 -18.21 -76.25 0 -13.87 -76.25 2.31 -13.99
  [4,16,-76.25,0,-18.33,-76.25,-2.28,-18.21,-76.25,0,-13.87,-76.25,2.31,-13.99],
// 4 16 -76.25 2.3 -18.21 -76.25 0 -18.33 -76.25 2.31 -13.99 -76.25 3.89 -14.38
  [4,16,-76.25,2.3,-18.21,-76.25,0,-18.33,-76.25,2.31,-13.99,-76.25,3.89,-14.38],
// 4 16 -76.25 3.87 -17.8 -76.25 2.3 -18.21 -76.25 3.89 -14.38 -76.25 4.79 -15.07
  [4,16,-76.25,3.87,-17.8,-76.25,2.3,-18.21,-76.25,3.89,-14.38,-76.25,4.79,-15.07],
// 4 16 -76.25 4.79 -17.1 -76.25 3.87 -17.8 -76.25 4.79 -15.07 -76.25 5.09 -16.1
  [4,16,-76.25,4.79,-17.1,-76.25,3.87,-17.8,-76.25,4.79,-15.07,-76.25,5.09,-16.1],
// 3 16 -74.8247 -4.8516 -3.9694 -73.8995 1.7179 .0208 -74.6839 1.7353 -3.9969
  [3,16,-74.8247,-4.8516,-3.9694,-73.8995,1.7179,.0208,-74.6839,1.7353,-3.9969],
// 4 16 -76.25 -4.86 -23.24 -76.25 -5.01 -25.14 -76.25 -5.46 -26.3 -76.25 -5.61 -20.05
  [4,16,-76.25,-4.86,-23.24,-76.25,-5.01,-25.14,-76.25,-5.46,-26.3,-76.25,-5.61,-20.05],
// 4 16 -76.25 -6.44 -19.3 -76.25 -6.27 -27 -76.25 -7.5 -27.35 -76.25 -7.02 -18.4
  [4,16,-76.25,-6.44,-19.3,-76.25,-6.27,-27,-76.25,-7.5,-27.35,-76.25,-7.02,-18.4],
// 3 16 -76.25 -11 -10.5677 -76.25 -7.5 -27.35 -76.25 -7.5 -29.76
  [3,16,-76.25,-11,-10.5677,-76.25,-7.5,-27.35,-76.25,-7.5,-29.76],
// 3 16 -76.25 -11 -10.5677 -76.25 -7.5 -29.76 -76.25 -7.5 -33.8
  [3,16,-76.25,-11,-10.5677,-76.25,-7.5,-29.76,-76.25,-7.5,-33.8],
// 4 16 -76.25 .54 -32.83 -76.25 -7.5 -33.8 -76.25 -7.5 -29.76 -76.25 7.5 -29.76
  [4,16,-76.25,.54,-32.83,-76.25,-7.5,-33.8,-76.25,-7.5,-29.76,-76.25,7.5,-29.76],
// 3 16 -76.25 .54 -32.83 -76.25 7.5 -29.76 -76.25 3.05 -32.33
  [3,16,-76.25,.54,-32.83,-76.25,7.5,-29.76,-76.25,3.05,-32.33],
// 3 16 -76.25 3.05 -32.33 -76.25 7.5 -29.76 -76.25 4.91 -32.75
  [3,16,-76.25,3.05,-32.33,-76.25,7.5,-29.76,-76.25,4.91,-32.75],
// 3 16 -76.25 4.91 -32.75 -76.25 7.5 -29.76 -76.25 6.32 -33.8
  [3,16,-76.25,4.91,-32.75,-76.25,7.5,-29.76,-76.25,6.32,-33.8],
// 3 16 -76.25 7.2 -35.41 -76.25 6.32 -33.8 -76.25 7.5 -29.76
  [3,16,-76.25,7.2,-35.41,-76.25,6.32,-33.8,-76.25,7.5,-29.76],
// 3 16 -76.25 7.5 -29.76 -76.25 11 -13.0658 -76.25 7.2 -35.41
  [3,16,-76.25,7.5,-29.76,-76.25,11,-13.0658,-76.25,7.2,-35.41],
// 3 16 -76.25 7.5 -29.76 -76.25 7.5 -26.82 -76.25 11 -13.0658
  [3,16,-76.25,7.5,-29.76,-76.25,7.5,-26.82,-76.25,11,-13.0658],
// 4 16 -76.25 3.32 -21.04 -76.25 7.5 -26.82 -76.25 -2.75 -26.82 -76.25 .03 -21.35
  [4,16,-76.25,3.32,-21.04,-76.25,7.5,-26.82,-76.25,-2.75,-26.82,-76.25,.03,-21.35],
// 4 16 -76.25 .03 -21.35 -76.25 -2.75 -26.82 -76.25 -2.75 -23.24 -76.25 -2.22 -21.15
  [4,16,-76.25,.03,-21.35,-76.25,-2.75,-26.82,-76.25,-2.75,-23.24,-76.25,-2.22,-21.15],
// 4 16 -76.25 -2.22 -21.15 -76.25 -2.75 -23.24 -76.25 -4.86 -23.24 -76.25 -3.26 -21.04
  [4,16,-76.25,-2.22,-21.15,-76.25,-2.75,-23.24,-76.25,-4.86,-23.24,-76.25,-3.26,-21.04],
// 4 16 -72.2754 -11.0706 8.2593 -76 -11 -10.5677 -76 11 -13.0658 -71.8499 10.9079 8.1893
  [4,16,-72.2754,-11.0706,8.2593,-76,-11,-10.5677,-76,11,-13.0658,-71.8499,10.9079,8.1893],
// 4 16 -76 -11 -10.5677 -76 -11 -49 -76 11 -49 -76 11 -13.0658
  [4,16,-76,-11,-10.5677,-76,-11,-49,-76,11,-49,-76,11,-13.0658],
// 4 16 -72.0999 10.9079 8.1893 -72.5254 -11.0706 8.2593 -72.2754 -11.0706 8.2593 -71.8499 10.9079 8.1893
  [4,16,-72.0999,10.9079,8.1893,-72.5254,-11.0706,8.2593,-72.2754,-11.0706,8.2593,-71.8499,10.9079,8.1893],
// 4 16 -76.25 -11 -49 -76.25 11 -49 -76 11 -49 -76 -11 -49
  [4,16,-76.25,-11,-49,-76.25,11,-49,-76,11,-49,-76,-11,-49],
// 4 16 -76 -11 -10.5677 -72.2754 -11.0706 8.2593 -72.5254 -11.0706 8.2593 -76.25 -11 -10.5677
  [4,16,-76,-11,-10.5677,-72.2754,-11.0706,8.2593,-72.5254,-11.0706,8.2593,-76.25,-11,-10.5677],
// 4 16 -76 -11 -10.5677 -76.25 -11 -10.5677 -76.25 -11 -49 -76 -11 -49
  [4,16,-76,-11,-10.5677,-76.25,-11,-10.5677,-76.25,-11,-49,-76,-11,-49],
// 4 16 -76 11 -13.0658 -76 11 -49 -76.25 11 -49 -76.25 11 -13.0658
  [4,16,-76,11,-13.0658,-76,11,-49,-76.25,11,-49,-76.25,11,-13.0658],
// 4 16 -71.8499 10.9079 8.1893 -76 11 -13.0658 -76.25 11 -13.0658 -72.0999 10.9079 8.1893
  [4,16,-71.8499,10.9079,8.1893,-76,11,-13.0658,-76.25,11,-13.0658,-72.0999,10.9079,8.1893],
// 5 24 -76.25 11 -13.0658 -76.25 -11 -10.5677 -76.25 -11 -49 -72.5085 -11.0845 8.256
  [5,24,-76.25,11,-13.0658,-76.25,-11,-10.5677,-76.25,-11,-49,-72.5085,-11.0845,8.256],
// 5 24 -76 -11 -10.5677 -76 11 -13.0658 -76 11 -49 -71.8499 10.9079 8.1893
  [5,24,-76,-11,-10.5677,-76,11,-13.0658,-76,11,-49,-71.8499,10.9079,8.1893],
];
module ldraw_lib__194295bc02(step=0, col=false, unit=2/5, alt=false, line=0.2, solid=!$preview)
    makepoly(ldraw_lib__194295bc02(), step=step, col=col, unit=unit, alt=alt, line=line, solid=solid);
ldraw_lib__194295bc02(line=0.2);
